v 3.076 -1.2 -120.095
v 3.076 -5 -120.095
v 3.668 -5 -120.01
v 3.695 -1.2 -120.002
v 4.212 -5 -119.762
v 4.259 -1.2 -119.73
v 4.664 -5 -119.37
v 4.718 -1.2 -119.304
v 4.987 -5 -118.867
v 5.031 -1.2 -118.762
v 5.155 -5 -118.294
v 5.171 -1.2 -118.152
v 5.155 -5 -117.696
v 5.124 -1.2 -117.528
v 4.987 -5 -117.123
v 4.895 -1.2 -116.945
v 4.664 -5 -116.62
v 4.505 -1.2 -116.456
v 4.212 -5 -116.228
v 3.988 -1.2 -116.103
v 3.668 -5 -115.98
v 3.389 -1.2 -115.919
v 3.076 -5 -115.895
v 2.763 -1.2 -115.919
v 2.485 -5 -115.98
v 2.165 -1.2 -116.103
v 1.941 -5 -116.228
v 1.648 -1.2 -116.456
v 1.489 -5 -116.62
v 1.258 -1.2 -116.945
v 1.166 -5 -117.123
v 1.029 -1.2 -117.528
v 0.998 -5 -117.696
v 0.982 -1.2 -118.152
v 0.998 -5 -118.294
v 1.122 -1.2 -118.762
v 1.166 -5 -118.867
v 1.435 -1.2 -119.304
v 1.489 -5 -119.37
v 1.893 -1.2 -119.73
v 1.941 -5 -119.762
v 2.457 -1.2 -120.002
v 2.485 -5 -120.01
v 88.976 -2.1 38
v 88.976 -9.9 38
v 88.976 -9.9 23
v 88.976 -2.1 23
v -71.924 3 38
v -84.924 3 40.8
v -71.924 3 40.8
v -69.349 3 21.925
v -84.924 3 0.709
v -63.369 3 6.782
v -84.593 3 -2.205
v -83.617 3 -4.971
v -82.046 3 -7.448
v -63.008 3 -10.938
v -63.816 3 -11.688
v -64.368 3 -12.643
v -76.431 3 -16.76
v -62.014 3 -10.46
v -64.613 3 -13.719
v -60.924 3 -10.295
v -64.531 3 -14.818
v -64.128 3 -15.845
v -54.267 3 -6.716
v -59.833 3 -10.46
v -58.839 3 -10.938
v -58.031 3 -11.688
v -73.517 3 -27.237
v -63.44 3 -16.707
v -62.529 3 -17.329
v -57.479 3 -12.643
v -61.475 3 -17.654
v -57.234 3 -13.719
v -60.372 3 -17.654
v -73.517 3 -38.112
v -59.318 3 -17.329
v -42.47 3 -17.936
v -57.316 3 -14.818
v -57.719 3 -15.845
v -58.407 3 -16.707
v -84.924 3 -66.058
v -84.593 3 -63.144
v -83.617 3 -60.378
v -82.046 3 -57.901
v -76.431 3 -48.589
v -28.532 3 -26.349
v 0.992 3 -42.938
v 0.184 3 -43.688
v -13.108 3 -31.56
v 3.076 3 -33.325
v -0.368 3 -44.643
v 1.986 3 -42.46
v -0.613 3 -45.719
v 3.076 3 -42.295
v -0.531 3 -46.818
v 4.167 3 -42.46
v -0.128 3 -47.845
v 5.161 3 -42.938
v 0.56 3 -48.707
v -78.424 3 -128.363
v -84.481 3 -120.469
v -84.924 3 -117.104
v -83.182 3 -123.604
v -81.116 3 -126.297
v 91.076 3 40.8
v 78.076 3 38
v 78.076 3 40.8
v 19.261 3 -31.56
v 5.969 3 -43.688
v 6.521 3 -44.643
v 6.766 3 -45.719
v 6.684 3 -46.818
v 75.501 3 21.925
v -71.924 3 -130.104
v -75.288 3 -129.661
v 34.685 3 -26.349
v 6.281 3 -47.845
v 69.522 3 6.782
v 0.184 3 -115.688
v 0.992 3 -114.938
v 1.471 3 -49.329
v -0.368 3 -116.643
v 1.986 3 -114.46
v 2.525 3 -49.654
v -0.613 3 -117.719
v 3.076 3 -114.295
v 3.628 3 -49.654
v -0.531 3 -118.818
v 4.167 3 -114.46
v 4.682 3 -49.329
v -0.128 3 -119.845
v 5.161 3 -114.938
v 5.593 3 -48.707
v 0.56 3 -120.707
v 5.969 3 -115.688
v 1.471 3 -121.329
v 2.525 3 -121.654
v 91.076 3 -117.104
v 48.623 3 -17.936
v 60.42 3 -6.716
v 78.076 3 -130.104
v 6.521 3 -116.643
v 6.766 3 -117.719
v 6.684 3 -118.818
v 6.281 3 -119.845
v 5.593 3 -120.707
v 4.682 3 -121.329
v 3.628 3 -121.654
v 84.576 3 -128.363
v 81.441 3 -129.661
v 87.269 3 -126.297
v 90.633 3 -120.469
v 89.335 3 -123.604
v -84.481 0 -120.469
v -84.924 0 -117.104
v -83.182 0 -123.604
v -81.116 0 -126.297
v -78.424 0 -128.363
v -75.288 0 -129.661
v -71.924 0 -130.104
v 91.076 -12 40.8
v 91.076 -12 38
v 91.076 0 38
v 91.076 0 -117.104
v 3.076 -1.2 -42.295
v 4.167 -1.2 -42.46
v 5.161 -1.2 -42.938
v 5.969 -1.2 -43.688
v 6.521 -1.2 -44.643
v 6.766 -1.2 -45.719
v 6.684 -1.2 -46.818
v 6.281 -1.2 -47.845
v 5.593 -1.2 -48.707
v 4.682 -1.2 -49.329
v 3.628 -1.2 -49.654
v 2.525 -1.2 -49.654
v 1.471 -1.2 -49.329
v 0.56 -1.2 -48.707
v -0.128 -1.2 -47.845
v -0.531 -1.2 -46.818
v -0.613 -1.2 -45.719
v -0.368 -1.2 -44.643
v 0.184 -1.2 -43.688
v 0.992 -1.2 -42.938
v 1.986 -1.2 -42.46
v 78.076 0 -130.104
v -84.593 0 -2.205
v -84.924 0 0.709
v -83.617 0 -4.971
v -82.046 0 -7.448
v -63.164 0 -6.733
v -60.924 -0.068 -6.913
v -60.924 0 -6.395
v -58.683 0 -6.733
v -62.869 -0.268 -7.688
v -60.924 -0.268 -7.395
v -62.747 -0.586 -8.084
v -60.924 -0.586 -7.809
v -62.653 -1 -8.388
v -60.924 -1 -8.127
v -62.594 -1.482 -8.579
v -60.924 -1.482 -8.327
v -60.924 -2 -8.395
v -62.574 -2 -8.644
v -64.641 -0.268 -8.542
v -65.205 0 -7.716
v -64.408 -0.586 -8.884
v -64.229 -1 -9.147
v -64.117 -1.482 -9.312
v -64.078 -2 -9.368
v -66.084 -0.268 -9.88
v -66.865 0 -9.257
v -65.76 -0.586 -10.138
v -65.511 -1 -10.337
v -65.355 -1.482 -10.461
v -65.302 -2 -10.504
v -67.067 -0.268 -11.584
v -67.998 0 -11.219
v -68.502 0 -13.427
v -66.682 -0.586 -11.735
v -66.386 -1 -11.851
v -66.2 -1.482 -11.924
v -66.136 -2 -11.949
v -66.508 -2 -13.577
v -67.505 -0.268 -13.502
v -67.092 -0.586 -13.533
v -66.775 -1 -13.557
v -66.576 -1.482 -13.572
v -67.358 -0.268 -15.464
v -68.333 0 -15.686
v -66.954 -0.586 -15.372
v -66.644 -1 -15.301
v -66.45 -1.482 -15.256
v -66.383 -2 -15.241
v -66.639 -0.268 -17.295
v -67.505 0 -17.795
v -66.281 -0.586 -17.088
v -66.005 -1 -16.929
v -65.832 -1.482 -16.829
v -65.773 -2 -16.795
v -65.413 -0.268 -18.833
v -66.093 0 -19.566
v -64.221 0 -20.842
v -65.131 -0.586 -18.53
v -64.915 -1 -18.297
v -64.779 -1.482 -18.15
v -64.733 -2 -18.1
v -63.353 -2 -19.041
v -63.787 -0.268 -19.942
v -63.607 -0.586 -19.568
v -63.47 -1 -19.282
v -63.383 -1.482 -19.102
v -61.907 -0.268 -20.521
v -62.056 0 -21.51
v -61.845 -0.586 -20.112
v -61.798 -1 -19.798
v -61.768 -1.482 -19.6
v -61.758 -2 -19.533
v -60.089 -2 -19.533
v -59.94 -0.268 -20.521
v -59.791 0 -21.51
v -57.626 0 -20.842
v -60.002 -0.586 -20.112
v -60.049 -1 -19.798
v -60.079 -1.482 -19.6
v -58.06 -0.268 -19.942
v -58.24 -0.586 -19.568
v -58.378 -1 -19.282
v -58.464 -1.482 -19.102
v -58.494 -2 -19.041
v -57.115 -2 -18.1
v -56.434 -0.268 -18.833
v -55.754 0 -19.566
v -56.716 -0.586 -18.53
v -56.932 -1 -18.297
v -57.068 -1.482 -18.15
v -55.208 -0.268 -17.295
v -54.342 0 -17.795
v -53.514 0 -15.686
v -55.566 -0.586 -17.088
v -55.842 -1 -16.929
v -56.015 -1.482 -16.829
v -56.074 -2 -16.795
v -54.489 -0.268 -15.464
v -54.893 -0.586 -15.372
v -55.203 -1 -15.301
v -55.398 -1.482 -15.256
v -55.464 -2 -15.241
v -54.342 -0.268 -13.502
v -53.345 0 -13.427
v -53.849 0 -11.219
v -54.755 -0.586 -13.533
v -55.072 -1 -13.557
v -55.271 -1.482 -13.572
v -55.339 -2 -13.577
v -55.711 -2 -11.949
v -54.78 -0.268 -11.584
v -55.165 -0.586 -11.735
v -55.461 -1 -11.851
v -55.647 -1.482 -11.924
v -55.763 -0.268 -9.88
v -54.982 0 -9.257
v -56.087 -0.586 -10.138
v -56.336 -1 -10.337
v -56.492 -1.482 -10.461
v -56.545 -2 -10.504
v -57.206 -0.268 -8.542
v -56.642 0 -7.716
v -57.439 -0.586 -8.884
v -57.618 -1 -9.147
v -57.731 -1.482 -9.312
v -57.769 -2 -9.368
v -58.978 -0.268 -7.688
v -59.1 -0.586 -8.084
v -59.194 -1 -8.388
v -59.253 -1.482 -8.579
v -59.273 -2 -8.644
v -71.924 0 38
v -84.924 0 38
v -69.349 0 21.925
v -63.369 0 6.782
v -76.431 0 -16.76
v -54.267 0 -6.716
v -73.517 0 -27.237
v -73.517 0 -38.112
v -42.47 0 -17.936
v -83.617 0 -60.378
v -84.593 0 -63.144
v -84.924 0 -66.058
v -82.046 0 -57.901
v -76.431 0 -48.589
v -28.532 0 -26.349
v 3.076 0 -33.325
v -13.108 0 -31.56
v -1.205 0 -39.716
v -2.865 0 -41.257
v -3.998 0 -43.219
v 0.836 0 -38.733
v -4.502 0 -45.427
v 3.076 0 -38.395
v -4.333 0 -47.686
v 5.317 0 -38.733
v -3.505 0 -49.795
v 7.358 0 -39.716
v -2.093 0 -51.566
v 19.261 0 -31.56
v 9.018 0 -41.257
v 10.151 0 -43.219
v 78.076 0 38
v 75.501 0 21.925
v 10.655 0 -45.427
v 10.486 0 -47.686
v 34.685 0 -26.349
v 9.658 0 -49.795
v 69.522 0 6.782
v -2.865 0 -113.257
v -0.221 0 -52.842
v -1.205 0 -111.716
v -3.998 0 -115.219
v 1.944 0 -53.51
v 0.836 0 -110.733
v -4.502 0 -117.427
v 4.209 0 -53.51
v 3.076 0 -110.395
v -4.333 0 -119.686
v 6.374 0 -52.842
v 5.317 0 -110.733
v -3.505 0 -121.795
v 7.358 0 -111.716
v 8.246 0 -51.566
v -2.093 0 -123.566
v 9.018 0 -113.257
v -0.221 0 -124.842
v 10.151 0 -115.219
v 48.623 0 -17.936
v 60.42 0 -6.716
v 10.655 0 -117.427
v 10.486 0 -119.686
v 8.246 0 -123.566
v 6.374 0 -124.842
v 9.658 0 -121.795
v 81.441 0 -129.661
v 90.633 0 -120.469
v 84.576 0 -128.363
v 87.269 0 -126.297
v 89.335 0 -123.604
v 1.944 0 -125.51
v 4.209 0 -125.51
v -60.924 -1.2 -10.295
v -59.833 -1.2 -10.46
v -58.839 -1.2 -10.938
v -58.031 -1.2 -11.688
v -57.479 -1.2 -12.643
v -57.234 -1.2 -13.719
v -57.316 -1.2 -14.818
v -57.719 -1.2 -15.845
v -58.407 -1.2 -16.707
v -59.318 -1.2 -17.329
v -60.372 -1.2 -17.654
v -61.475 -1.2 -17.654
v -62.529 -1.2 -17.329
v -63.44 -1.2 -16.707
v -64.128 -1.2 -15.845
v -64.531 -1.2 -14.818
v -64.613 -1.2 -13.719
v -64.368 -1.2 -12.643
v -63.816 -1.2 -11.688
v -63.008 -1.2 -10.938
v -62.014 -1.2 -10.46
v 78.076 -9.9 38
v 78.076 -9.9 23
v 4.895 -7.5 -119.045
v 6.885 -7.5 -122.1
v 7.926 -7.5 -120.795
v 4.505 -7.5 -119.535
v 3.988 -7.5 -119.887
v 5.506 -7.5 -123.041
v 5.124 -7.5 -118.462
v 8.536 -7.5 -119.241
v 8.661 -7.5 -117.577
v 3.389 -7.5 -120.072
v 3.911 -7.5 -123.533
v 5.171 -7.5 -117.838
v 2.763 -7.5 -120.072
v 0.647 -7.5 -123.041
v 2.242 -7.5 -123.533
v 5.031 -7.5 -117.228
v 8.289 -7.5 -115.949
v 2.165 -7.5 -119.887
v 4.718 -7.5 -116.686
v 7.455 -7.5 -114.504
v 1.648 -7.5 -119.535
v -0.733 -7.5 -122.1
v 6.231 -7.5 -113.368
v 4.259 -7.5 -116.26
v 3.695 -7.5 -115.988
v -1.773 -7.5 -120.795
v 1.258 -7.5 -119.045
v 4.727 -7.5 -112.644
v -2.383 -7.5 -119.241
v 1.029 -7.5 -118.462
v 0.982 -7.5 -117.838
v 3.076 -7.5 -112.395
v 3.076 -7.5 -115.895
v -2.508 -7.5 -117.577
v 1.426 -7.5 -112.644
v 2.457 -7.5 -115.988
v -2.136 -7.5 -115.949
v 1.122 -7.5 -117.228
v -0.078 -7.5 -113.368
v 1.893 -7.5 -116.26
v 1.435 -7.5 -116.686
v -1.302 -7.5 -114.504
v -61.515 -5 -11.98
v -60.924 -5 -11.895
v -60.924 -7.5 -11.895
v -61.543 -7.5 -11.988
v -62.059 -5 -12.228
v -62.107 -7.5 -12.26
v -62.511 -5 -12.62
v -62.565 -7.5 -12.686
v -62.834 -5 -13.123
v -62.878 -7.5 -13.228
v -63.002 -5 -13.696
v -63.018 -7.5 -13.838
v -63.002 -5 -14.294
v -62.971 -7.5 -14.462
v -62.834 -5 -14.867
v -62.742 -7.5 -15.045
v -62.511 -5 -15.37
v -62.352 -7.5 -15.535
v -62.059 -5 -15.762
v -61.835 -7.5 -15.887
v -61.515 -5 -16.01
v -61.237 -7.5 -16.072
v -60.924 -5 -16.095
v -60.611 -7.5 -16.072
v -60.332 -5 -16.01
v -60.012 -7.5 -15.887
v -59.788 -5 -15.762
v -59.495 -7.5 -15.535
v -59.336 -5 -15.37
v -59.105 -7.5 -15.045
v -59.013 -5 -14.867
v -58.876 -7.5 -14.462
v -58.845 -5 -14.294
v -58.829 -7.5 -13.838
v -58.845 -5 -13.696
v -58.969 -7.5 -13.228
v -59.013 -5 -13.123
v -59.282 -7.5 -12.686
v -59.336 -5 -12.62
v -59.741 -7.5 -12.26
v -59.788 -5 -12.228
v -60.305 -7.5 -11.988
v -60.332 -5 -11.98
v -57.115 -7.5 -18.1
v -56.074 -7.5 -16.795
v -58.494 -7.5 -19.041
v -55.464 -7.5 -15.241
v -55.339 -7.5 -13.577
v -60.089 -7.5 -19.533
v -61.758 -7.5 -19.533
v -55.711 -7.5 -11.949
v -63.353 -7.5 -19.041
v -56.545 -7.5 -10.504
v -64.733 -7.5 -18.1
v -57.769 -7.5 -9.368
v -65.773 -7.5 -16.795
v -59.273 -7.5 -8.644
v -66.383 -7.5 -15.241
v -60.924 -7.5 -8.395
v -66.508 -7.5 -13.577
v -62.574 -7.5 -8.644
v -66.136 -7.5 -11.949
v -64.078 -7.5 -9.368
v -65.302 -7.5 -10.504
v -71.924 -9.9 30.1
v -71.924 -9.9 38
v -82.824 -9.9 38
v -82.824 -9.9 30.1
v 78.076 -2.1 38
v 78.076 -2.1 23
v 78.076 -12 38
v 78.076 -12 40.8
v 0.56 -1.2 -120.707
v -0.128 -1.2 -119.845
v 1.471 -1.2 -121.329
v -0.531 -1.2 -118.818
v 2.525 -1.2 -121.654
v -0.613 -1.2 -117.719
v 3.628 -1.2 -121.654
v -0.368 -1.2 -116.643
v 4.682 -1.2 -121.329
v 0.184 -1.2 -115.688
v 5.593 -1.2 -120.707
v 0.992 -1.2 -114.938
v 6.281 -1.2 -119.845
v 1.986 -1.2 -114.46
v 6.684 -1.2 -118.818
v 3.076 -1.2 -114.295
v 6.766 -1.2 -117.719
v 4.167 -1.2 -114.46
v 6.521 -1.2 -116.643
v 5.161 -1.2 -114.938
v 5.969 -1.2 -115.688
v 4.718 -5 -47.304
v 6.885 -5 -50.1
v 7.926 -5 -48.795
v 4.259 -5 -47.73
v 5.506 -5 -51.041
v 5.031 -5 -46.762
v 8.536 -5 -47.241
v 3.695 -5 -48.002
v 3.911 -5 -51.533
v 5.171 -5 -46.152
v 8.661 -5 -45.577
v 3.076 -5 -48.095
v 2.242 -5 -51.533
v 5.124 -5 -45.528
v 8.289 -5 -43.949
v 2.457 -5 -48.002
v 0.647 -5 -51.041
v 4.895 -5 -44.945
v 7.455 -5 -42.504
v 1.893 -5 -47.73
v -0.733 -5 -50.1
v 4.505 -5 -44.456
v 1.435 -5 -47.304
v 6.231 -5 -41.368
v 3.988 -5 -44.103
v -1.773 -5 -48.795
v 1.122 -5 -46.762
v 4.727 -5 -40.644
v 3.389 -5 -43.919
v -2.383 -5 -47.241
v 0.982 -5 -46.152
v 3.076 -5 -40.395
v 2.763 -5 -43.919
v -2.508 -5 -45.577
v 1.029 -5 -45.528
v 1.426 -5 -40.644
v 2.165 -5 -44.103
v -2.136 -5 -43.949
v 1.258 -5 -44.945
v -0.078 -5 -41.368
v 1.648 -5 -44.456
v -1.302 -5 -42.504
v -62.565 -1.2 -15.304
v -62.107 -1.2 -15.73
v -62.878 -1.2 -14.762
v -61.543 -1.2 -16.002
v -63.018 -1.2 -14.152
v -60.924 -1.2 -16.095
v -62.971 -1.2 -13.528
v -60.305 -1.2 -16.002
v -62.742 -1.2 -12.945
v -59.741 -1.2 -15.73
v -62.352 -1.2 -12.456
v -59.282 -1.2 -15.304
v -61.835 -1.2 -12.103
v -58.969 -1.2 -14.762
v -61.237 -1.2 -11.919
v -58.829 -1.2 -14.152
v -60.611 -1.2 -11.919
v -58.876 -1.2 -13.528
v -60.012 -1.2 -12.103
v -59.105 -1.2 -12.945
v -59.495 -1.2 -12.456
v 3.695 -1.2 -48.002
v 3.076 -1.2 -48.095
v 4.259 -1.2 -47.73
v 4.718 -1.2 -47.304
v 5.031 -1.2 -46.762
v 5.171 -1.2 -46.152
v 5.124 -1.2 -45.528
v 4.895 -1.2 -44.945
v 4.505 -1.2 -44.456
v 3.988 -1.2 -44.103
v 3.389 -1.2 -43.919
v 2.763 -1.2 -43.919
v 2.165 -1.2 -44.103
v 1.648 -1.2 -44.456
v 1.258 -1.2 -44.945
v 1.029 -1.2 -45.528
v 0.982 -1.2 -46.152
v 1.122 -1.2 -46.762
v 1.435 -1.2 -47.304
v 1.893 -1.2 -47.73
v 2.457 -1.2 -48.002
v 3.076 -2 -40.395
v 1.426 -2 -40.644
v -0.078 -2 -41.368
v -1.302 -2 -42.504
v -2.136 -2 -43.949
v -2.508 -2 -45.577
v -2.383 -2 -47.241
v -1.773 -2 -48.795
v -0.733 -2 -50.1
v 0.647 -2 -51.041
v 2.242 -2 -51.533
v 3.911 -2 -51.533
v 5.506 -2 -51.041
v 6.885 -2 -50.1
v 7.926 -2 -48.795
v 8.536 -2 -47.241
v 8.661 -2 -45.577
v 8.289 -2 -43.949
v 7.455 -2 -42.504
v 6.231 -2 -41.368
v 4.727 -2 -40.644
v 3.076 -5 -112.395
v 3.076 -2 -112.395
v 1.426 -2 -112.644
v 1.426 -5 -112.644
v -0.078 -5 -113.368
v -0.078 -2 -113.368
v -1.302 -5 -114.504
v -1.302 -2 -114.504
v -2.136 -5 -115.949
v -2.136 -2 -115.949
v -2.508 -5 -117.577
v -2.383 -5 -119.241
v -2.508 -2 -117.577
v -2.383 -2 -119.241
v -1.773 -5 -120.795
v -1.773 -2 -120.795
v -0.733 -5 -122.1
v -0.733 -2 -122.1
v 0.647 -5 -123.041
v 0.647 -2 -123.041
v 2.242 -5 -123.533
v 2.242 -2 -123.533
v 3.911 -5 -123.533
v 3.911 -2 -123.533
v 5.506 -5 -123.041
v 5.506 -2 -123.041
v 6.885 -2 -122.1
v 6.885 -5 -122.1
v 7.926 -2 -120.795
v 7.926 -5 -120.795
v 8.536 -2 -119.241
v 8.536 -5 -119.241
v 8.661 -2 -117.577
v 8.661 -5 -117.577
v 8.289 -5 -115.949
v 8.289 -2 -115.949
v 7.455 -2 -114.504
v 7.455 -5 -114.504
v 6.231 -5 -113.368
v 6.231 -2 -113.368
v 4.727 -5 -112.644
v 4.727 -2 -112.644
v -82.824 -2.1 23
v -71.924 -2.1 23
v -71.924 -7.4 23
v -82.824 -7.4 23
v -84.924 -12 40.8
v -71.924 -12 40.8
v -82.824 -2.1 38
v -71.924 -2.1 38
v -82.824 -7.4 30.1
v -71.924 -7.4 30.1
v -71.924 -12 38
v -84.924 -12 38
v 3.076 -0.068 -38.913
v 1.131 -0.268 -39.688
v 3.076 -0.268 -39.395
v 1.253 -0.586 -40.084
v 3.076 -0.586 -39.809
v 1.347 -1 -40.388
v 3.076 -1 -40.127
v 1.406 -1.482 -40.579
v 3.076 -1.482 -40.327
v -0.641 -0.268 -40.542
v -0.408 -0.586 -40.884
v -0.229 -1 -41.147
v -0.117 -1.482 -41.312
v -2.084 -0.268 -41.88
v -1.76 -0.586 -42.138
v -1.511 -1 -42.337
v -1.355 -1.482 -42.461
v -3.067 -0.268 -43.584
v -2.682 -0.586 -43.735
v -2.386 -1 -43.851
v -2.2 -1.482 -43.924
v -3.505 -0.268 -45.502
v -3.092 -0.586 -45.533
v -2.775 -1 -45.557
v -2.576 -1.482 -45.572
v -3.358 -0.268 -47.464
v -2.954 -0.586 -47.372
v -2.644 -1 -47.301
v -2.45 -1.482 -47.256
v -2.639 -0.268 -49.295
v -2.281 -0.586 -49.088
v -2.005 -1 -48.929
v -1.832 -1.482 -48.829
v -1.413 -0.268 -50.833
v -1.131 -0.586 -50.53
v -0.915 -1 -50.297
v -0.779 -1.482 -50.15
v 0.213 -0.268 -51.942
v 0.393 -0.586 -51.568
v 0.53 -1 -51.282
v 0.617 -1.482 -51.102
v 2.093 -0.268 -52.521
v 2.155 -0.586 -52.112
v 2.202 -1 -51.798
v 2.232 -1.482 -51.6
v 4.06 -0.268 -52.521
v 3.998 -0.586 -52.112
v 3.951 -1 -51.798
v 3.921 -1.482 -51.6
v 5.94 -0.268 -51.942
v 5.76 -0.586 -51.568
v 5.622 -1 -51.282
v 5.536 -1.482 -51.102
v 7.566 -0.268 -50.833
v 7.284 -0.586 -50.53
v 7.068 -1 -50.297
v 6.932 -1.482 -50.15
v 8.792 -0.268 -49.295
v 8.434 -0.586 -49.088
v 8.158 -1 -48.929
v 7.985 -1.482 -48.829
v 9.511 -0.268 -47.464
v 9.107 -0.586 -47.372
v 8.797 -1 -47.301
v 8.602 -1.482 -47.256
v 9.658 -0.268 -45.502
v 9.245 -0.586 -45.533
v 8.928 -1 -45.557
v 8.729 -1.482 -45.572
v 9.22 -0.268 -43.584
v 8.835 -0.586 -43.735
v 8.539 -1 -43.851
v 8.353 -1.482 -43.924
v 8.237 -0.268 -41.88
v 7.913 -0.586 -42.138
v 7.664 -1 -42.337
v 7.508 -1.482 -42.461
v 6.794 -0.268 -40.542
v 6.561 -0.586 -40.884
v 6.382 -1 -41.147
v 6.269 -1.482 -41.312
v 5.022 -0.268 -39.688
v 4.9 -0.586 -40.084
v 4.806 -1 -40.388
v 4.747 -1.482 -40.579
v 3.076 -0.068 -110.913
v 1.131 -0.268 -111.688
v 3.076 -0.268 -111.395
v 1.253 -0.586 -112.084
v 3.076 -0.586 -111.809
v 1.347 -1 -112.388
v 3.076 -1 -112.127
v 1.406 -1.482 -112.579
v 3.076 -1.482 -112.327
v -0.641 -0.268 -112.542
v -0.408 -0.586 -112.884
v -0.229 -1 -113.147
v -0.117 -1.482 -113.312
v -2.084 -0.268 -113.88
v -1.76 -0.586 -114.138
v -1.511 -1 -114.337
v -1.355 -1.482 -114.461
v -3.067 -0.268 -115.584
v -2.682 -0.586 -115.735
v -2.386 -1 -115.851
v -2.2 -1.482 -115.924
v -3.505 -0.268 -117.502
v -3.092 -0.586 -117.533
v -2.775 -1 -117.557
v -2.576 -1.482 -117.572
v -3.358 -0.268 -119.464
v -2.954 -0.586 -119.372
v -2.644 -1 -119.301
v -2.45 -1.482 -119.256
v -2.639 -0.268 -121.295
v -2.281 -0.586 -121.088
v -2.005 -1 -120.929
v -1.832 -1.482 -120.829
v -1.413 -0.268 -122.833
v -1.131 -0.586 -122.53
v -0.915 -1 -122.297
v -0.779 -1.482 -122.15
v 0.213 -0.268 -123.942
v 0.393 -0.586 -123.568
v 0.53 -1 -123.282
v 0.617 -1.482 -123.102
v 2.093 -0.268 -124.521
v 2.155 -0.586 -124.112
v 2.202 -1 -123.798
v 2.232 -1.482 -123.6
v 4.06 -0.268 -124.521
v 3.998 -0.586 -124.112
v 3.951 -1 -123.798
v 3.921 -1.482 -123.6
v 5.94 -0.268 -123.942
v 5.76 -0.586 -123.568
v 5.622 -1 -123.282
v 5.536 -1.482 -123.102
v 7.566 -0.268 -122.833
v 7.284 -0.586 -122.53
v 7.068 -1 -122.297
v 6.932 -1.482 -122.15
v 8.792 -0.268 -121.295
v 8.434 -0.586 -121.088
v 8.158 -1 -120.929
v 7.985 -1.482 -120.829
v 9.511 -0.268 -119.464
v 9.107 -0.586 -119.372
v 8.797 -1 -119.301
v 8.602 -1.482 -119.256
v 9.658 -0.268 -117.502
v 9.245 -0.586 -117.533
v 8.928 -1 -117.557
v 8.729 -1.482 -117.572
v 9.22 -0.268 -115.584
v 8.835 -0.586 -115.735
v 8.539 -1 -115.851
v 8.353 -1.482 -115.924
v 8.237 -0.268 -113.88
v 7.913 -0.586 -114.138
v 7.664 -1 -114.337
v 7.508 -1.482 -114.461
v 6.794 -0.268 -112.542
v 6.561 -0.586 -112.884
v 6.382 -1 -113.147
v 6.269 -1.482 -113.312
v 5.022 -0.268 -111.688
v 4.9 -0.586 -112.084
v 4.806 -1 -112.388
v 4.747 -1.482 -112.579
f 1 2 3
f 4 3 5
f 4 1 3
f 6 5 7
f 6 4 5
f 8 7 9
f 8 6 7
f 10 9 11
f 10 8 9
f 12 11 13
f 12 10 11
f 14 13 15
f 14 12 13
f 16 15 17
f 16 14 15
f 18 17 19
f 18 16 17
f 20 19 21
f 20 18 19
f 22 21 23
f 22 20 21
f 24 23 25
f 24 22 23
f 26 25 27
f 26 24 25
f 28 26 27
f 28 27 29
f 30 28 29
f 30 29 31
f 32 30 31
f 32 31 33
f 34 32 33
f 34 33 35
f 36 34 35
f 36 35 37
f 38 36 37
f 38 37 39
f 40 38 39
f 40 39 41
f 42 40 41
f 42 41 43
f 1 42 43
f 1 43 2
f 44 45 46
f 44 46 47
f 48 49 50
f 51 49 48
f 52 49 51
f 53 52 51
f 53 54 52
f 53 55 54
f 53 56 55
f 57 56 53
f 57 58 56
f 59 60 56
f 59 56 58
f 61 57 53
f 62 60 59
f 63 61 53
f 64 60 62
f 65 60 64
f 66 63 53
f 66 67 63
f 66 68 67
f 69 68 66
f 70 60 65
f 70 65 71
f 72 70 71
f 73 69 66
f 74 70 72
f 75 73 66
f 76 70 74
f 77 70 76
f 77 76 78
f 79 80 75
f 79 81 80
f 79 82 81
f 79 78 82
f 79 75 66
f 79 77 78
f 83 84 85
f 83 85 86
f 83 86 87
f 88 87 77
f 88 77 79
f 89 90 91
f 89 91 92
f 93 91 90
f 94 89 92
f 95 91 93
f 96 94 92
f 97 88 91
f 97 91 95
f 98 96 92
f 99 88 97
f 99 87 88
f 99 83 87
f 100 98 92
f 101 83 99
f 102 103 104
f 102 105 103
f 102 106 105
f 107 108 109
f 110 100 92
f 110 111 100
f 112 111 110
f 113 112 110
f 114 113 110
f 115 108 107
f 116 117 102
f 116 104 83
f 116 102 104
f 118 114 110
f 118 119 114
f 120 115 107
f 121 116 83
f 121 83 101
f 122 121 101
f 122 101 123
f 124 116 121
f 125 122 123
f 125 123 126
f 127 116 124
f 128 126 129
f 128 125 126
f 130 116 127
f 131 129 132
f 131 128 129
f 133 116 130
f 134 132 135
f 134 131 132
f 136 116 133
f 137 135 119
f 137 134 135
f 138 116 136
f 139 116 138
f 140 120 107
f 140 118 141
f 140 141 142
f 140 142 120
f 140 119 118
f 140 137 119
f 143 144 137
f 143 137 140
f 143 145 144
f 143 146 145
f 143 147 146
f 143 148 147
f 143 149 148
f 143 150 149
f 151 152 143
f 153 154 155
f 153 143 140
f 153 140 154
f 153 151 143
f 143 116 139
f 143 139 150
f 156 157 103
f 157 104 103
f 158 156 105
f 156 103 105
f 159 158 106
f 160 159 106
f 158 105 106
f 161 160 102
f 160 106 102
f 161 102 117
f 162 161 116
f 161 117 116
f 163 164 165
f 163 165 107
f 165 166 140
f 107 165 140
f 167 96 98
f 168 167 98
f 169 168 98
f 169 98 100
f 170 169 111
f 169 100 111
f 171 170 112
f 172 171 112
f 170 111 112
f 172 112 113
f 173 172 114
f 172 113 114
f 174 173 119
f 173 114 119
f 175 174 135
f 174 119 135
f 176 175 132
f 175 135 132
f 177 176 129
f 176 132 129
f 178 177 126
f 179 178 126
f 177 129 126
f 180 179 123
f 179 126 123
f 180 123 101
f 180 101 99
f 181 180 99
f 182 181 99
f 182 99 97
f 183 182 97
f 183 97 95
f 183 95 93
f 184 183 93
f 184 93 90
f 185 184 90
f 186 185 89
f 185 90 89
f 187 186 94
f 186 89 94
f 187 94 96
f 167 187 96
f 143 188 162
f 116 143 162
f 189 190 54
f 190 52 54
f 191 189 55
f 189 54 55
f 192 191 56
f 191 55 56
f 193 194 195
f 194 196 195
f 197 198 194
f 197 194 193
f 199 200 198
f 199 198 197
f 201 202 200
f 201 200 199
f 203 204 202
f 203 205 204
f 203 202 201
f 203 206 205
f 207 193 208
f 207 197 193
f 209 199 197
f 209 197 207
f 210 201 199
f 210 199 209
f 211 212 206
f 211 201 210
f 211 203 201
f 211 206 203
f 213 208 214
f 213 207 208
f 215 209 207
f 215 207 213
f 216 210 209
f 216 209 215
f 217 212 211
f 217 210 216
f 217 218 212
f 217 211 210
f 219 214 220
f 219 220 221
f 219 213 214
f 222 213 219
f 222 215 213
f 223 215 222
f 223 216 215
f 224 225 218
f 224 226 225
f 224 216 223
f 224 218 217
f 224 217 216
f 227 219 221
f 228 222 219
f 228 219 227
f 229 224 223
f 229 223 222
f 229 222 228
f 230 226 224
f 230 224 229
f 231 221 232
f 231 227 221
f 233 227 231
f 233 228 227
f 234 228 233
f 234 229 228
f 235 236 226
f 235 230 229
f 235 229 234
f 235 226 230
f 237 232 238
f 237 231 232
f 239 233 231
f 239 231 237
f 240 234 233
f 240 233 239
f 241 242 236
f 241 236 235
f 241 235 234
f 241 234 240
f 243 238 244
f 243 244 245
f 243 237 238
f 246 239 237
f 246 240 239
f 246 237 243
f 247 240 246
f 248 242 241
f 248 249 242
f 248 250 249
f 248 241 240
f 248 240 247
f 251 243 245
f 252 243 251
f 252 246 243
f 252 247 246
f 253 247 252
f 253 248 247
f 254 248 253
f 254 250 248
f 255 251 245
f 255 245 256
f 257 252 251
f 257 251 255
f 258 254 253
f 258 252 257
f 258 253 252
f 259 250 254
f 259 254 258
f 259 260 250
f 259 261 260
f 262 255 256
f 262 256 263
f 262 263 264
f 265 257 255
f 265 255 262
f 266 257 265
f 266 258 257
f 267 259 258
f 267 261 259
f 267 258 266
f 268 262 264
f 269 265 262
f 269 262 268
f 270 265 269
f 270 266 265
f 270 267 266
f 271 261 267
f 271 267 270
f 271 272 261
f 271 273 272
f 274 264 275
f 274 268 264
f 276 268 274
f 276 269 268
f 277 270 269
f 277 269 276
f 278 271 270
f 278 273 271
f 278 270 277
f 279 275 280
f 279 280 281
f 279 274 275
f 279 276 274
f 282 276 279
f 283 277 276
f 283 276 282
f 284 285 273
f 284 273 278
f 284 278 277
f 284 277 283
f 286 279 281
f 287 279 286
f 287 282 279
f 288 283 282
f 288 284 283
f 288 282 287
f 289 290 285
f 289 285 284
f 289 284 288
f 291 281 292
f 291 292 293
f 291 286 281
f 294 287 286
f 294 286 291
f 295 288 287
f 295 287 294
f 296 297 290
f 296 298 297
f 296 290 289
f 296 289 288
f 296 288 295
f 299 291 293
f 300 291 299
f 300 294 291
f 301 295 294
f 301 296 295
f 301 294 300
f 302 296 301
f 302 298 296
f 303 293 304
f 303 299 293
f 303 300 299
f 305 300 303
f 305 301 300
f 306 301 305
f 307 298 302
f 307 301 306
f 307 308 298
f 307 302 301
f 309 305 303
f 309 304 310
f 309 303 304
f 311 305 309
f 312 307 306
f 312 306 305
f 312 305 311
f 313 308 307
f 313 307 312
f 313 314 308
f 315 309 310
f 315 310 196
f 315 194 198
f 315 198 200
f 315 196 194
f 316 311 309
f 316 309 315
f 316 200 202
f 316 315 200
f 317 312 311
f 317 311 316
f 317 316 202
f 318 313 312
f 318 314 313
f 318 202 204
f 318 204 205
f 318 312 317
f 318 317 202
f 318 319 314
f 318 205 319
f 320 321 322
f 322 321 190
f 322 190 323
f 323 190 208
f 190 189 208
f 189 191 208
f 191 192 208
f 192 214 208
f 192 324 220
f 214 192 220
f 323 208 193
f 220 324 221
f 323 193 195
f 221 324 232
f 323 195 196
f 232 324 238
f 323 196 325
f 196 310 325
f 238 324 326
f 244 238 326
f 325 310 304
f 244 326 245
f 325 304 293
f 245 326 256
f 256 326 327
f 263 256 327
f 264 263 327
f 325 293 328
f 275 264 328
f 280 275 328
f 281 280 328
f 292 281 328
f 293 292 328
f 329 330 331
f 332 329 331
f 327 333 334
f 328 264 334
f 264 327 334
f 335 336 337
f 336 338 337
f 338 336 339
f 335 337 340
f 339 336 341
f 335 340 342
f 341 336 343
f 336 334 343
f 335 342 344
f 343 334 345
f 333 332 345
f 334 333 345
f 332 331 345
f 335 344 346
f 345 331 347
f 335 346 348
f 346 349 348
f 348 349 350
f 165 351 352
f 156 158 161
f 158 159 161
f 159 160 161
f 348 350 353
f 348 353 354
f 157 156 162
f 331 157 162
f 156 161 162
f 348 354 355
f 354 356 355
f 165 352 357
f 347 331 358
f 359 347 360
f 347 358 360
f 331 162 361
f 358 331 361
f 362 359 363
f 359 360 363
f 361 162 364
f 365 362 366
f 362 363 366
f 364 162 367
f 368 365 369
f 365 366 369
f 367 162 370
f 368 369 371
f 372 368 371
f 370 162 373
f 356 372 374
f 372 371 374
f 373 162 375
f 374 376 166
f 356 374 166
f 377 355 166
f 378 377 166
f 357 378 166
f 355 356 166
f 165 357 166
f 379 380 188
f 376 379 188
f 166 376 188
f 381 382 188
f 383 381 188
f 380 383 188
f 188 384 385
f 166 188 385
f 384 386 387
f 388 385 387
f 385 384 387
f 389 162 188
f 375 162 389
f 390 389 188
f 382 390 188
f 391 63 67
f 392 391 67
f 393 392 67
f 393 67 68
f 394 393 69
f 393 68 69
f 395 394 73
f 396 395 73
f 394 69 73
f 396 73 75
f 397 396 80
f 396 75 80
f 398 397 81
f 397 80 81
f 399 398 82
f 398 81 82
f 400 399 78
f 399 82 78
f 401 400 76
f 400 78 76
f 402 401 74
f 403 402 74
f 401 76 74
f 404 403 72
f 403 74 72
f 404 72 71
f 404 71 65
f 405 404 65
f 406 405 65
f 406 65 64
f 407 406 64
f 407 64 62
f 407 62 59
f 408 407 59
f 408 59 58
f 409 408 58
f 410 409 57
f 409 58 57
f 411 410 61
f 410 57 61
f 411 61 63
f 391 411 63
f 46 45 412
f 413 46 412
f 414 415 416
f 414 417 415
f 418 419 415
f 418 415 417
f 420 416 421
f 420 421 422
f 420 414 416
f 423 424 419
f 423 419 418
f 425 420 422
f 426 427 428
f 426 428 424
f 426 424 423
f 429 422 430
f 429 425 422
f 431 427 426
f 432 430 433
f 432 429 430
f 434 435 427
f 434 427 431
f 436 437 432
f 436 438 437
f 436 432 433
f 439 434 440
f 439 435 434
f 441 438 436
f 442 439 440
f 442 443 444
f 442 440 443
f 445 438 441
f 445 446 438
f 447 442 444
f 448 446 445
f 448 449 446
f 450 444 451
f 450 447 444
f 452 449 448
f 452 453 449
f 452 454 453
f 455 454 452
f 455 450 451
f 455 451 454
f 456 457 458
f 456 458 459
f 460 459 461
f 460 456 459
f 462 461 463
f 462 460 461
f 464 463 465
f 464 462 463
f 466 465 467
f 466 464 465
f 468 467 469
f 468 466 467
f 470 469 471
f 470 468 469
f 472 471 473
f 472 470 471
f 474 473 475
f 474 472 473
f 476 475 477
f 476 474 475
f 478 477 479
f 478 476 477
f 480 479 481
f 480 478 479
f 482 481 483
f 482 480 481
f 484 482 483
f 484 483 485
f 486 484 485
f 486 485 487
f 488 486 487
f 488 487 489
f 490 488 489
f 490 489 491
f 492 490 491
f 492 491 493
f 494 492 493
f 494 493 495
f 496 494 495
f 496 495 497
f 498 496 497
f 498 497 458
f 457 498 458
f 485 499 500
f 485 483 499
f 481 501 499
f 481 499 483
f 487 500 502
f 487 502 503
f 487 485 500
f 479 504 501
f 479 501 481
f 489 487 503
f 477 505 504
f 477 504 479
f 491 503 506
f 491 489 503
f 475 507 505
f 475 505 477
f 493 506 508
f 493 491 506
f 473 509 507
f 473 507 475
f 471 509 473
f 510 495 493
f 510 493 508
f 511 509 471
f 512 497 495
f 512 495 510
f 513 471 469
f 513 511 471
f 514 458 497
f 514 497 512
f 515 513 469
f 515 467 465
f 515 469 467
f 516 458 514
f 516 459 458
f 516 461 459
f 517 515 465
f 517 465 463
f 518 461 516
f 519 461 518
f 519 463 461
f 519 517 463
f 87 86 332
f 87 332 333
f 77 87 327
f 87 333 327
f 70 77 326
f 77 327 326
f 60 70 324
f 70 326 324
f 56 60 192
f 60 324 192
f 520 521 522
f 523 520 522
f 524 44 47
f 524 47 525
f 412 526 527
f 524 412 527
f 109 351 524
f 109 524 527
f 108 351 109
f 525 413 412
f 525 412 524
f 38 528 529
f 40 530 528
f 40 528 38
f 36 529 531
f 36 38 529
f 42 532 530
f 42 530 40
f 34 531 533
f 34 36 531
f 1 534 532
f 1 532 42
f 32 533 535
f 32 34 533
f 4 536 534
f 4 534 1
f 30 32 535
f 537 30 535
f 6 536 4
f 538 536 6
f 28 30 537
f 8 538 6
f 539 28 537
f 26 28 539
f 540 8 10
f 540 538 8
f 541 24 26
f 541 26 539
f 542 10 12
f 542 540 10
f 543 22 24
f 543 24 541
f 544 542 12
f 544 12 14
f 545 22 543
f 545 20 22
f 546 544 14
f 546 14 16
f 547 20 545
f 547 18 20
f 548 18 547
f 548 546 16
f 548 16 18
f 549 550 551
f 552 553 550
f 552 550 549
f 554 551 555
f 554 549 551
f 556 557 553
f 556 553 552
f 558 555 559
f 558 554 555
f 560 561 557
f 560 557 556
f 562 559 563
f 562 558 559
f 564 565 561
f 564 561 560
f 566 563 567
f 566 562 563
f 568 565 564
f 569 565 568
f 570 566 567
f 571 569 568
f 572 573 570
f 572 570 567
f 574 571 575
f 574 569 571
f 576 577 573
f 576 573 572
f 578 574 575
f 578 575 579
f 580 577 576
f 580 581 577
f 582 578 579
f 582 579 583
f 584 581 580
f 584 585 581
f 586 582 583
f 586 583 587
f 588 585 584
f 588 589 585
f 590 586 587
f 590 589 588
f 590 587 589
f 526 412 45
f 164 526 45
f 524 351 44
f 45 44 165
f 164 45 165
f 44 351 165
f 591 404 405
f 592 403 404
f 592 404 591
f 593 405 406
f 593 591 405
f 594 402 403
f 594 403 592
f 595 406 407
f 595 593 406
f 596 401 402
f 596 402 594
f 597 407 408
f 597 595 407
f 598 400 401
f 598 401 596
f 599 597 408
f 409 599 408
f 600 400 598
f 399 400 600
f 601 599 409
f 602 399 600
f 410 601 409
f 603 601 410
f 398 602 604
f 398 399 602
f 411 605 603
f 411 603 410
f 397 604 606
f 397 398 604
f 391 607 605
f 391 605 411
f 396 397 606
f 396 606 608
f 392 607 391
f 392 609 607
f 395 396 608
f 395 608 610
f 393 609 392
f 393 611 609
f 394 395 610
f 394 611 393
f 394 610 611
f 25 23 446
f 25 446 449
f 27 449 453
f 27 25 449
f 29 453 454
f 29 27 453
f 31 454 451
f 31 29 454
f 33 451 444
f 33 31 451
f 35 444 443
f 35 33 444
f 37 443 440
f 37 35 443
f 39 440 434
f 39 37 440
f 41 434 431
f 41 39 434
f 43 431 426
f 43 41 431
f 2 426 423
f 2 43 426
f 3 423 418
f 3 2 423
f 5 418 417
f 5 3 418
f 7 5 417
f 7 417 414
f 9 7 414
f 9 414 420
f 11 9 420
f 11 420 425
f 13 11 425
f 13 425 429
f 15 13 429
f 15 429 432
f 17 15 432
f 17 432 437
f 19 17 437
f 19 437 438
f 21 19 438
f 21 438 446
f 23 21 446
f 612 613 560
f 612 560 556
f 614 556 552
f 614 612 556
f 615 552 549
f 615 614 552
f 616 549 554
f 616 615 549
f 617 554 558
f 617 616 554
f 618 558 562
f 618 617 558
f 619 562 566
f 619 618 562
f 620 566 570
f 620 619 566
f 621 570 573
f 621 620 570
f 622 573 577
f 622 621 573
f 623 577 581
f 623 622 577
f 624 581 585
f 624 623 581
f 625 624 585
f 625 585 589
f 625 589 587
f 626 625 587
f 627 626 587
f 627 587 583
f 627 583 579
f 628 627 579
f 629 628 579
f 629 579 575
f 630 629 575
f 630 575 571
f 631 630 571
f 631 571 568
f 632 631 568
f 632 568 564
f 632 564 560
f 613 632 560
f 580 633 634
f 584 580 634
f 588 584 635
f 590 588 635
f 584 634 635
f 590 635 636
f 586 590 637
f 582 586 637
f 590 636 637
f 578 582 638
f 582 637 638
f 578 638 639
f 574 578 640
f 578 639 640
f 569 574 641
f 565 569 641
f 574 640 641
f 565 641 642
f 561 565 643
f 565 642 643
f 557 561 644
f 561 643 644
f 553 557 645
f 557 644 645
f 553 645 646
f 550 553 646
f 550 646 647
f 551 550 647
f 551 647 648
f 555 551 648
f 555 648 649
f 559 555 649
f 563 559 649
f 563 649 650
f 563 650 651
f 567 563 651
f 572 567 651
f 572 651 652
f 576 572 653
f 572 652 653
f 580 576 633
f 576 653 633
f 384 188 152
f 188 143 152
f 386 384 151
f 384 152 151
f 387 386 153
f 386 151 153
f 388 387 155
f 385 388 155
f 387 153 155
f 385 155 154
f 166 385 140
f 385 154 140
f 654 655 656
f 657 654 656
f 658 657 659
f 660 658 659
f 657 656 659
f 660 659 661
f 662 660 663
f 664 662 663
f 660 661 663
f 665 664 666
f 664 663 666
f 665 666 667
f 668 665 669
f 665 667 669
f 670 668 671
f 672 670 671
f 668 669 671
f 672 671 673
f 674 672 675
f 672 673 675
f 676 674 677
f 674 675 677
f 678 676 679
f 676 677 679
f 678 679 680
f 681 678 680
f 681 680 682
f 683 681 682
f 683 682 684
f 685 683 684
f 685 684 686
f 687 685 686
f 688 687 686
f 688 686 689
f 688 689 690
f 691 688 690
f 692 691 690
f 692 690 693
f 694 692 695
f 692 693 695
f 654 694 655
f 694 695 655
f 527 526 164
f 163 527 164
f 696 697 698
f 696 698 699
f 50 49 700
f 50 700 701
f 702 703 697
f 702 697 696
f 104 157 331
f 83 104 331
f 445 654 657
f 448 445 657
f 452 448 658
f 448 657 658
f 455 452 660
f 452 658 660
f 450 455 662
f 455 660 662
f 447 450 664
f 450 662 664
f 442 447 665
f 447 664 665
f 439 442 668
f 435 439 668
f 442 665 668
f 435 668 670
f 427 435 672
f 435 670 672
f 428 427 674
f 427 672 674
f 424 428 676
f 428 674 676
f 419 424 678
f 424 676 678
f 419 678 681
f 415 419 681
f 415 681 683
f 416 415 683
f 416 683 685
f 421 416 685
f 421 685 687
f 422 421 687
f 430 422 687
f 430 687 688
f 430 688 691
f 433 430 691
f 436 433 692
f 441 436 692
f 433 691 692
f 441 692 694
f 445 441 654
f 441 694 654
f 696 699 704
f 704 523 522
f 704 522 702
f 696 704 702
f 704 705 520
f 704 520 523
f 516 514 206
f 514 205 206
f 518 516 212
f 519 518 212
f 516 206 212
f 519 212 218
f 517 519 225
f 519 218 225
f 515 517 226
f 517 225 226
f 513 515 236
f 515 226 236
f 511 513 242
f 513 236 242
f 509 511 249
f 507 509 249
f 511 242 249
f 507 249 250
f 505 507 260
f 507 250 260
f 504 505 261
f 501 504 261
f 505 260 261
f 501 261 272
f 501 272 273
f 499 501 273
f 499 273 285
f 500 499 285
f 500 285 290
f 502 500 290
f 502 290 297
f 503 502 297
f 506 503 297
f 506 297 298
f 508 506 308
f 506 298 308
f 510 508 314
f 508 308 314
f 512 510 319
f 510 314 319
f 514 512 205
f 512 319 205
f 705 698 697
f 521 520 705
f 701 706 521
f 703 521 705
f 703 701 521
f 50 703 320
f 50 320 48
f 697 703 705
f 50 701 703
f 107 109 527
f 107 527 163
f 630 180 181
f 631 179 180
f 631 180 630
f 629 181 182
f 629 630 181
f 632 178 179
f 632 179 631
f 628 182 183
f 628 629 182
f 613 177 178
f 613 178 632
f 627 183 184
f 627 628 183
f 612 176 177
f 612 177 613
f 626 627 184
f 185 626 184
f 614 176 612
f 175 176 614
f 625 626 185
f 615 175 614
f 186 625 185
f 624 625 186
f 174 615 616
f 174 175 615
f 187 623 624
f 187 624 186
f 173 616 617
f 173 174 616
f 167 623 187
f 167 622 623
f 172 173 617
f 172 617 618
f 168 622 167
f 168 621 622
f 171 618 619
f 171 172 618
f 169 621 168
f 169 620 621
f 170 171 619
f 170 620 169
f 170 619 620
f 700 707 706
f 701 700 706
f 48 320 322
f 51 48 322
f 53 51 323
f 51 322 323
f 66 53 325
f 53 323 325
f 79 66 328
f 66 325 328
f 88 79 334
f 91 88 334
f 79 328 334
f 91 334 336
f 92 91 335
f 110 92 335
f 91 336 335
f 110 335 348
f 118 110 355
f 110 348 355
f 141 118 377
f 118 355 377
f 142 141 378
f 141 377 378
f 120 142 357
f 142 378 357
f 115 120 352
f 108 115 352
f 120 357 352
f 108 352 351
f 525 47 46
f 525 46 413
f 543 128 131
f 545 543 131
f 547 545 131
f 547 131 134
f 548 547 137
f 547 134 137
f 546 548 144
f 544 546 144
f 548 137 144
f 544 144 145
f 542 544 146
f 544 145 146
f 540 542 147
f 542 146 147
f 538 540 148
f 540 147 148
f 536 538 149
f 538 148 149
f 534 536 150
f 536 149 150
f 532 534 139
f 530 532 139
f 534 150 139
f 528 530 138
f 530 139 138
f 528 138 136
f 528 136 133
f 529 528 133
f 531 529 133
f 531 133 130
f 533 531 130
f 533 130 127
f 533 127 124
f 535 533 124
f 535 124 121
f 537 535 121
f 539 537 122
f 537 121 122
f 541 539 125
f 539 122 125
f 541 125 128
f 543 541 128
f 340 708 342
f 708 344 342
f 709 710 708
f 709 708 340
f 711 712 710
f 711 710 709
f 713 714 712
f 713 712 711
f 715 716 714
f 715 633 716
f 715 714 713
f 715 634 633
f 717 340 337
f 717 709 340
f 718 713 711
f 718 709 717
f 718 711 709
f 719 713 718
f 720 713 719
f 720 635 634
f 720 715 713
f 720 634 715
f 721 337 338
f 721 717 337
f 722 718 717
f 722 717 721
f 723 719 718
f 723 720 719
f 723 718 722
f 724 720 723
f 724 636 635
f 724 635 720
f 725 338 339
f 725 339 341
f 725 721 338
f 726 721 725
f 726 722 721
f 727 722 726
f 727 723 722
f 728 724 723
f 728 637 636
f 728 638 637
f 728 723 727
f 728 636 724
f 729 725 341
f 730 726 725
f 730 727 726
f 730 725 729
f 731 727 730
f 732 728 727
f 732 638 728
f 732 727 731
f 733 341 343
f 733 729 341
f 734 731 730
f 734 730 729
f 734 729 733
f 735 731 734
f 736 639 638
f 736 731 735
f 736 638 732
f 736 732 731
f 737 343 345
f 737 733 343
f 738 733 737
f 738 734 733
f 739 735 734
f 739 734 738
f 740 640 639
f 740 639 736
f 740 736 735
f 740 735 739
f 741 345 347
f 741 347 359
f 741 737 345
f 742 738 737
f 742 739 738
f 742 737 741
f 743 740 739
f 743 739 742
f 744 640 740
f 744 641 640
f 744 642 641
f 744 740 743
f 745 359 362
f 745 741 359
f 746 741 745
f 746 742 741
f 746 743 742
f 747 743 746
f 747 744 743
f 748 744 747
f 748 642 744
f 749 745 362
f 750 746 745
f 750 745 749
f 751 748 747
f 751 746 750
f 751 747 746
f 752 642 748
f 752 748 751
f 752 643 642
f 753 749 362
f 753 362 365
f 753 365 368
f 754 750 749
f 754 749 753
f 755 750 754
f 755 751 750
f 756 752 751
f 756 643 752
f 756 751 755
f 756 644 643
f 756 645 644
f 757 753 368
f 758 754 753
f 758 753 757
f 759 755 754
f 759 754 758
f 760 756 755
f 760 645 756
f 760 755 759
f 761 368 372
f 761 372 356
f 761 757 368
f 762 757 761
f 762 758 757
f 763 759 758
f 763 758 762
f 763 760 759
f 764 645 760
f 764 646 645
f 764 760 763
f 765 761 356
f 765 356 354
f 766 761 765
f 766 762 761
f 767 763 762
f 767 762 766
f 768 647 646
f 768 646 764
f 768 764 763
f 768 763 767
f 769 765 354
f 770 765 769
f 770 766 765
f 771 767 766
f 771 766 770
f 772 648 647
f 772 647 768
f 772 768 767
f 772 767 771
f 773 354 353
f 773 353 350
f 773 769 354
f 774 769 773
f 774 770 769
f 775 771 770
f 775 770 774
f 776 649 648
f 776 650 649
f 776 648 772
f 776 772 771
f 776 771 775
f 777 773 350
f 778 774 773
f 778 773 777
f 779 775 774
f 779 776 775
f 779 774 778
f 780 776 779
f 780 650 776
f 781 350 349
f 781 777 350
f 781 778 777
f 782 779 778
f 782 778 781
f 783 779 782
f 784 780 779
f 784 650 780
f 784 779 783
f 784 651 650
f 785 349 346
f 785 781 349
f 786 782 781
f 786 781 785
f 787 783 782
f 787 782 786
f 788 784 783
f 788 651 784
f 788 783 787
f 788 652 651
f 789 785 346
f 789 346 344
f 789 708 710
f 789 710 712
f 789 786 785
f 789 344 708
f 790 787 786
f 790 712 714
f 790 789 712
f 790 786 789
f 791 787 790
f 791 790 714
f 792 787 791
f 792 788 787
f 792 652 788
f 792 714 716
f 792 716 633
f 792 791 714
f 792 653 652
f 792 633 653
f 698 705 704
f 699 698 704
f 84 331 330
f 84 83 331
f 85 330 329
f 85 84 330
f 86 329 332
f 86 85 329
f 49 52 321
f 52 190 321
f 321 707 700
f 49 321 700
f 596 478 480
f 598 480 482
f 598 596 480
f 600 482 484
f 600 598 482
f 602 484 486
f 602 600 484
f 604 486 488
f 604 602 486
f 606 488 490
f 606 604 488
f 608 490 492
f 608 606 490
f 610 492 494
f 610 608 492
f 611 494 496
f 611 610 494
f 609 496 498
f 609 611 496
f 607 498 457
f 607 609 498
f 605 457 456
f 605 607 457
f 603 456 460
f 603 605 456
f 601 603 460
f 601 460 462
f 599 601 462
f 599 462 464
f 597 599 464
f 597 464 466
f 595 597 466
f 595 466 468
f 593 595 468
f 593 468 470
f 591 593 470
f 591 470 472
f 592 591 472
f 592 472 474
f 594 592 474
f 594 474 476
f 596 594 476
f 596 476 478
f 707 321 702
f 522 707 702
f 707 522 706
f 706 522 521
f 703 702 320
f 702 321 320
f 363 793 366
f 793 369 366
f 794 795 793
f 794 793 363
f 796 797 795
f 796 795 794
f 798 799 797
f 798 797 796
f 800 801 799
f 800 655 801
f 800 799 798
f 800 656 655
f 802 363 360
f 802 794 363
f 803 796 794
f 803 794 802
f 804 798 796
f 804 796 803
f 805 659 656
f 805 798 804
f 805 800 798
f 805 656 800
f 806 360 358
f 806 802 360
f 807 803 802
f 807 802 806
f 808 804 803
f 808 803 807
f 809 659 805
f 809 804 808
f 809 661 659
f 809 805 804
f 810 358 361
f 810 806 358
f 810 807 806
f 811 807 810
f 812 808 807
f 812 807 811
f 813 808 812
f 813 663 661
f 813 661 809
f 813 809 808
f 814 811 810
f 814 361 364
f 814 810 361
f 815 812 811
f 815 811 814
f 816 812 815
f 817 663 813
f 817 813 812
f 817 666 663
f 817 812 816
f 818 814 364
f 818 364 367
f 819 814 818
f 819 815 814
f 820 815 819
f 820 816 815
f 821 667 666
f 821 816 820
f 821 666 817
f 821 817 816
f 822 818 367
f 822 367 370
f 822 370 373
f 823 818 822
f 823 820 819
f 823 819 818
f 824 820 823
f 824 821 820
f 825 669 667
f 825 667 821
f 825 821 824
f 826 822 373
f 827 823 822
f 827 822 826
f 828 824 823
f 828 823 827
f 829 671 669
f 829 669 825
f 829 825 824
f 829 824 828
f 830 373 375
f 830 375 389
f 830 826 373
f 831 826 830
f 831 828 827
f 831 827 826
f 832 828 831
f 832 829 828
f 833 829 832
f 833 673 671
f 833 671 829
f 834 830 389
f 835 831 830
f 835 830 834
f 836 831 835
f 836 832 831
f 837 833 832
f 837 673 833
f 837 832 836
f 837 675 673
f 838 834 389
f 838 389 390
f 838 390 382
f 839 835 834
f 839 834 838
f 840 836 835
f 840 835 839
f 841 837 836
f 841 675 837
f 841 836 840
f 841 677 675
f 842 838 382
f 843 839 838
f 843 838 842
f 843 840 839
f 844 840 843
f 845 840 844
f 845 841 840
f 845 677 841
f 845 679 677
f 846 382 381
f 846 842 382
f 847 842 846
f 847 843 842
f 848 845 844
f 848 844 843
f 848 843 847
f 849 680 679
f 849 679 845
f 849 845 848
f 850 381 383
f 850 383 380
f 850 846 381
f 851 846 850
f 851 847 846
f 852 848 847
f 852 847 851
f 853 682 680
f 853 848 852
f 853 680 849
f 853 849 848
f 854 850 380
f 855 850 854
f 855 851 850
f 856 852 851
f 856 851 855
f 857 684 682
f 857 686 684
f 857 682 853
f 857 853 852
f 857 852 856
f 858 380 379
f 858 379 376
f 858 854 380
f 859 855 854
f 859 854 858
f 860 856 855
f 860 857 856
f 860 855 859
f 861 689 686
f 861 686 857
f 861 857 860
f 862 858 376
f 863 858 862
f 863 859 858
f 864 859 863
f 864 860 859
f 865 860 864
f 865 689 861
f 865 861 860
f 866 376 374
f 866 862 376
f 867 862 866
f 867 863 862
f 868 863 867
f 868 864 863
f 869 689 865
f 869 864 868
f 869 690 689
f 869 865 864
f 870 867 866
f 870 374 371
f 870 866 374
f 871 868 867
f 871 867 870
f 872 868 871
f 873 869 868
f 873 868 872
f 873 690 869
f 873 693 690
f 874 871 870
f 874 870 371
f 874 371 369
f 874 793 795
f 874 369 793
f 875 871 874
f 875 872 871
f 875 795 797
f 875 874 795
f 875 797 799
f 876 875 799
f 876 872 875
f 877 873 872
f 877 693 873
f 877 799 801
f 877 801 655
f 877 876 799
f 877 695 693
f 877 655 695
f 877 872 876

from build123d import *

# Parameters (mm, degrees)
BOSS_EXTRUDE1_DEPTH = 3
SKETCH2_W           = 13
SKETCH2_H           = 15
BOSS_EXTRUDE2_DEPTH = 2.8
SKETCH3_W           = 10.9
SKETCH3_H           = 7.8
SKETCH3_H_2         = 5.3
BOSS_EXTRUDE3_DEPTH = 15
SKETCH4_W           = 10.9
SKETCH4_H           = 2.5
BOSS_EXTRUDE4_DEPTH = 7.9
FILLET3_R           = 13
SKETCH5_R           = 5.6
SKETCH5_R_2         = 2.1
BOSS_EXTRUDE5_DEPTH = 5
CUT_EXTRUDE1_START  = -7.9
SKETCH6_R           = 2.1
CUT_EXTRUDE1_DEPTH  = 7.9
SKETCH7_R           = 3.7
CUT_EXTRUDE2_DEPTH  = 4.2
FILLET5_R           = 2
SKETCH8_R           = 5.6
SKETCH8_R_2         = 2.1
BOSS_EXTRUDE6_DEPTH = 2.5


with BuildPart() as part:
    # Sketch1 → Boss-Extrude1 (new body)
    with BuildSketch(Plane(origin=(0, 0, 0), x_dir=(1, 0, 0), z_dir=(0, 1, 0))):
        with BuildLine():
            Line((78.076457806, -38), (91.076457806, -38))
            Line((91.076457806, -38), (91.076457806, 130.104439919))
            Line((91.076457806, 130.104439919), (-84.923542194, 130.104439919))
            Line((-84.923542194, 130.104439919), (-84.923542194, 72.662298294))
            Line((-84.923542194, 72.662298294), (-84.923542194, 61.104439919))
            ThreePointArc((-84.923542194, 61.104439919), (-73.14747421, 32.674496882), (-84.923542194, 4.244553845))
            Line((-84.923542194, 4.244553845), (-84.923542194, 0))
            Line((-84.923542194, 0), (-84.923542194, -38))
            Line((-84.923542194, -38), (-71.923542194, -38))
            ThreePointArc((-71.923542194, -38), (3.076457806, 33.325120397), (78.076457806, -38))
        make_face()
    extrude(amount=BOSS_EXTRUDE1_DEPTH)

    # Sketch2 → Boss-Extrude2 (add)
    with BuildSketch(Plane.XY.offset(38)):
        with Locations((84.576457806, -4.5)):
            Rectangle(SKETCH2_W, SKETCH2_H)
        with Locations((-78.423542194, -4.5)):
            Rectangle(SKETCH2_W, SKETCH2_H)
    extrude(amount=BOSS_EXTRUDE2_DEPTH)

    # Sketch3 → Boss-Extrude3 (add)
    with BuildSketch(Plane(origin=(0, 0, 38), x_dir=(-1, 0, 0), z_dir=(0, 0, -1))):
        with Locations((-83.526457806, -6)):
            Rectangle(SKETCH3_W, SKETCH3_H)
        with Locations((77.373542194, -4.75)):
            Rectangle(SKETCH3_W, SKETCH3_H_2)
    extrude(amount=BOSS_EXTRUDE3_DEPTH)

    # Sketch4 → Boss-Extrude4 (add)
    with BuildSketch(Plane(origin=(0, 0, 38), x_dir=(-1, 0, 0), z_dir=(0, 0, -1))):
        with Locations((77.373542194, -8.65)):
            Rectangle(SKETCH4_W, SKETCH4_H)
    extrude(amount=BOSS_EXTRUDE4_DEPTH)

    # Fillet3
    fillet3_edges = [part.edges().sort_by_distance(p)[0] for p in [
        (-84.923542194, 1.5, -130.104439919),
        (91.076457806, 1.5, -130.104439919),
        (-84.923542194, 1.5, -4.244553845),
        (-84.923542194, 1.5, -61.104439919),
    ]]
    fillet(fillet3_edges, radius=FILLET3_R)

    # Sketch5 → Boss-Extrude5 (add)
    # profile 1 of 3: a face of its own
    with BuildSketch(Plane.XZ):
        with Locations(Location((3.076457806, -45.995120397, 0), (0, 0, 90))):
            Circle(SKETCH5_R)
        with Locations(Location((3.076457806, -45.995120397, 0), (0, 0, 270))):
            Circle(SKETCH5_R_2, mode=Mode.SUBTRACT)
    # profile 2 of 3: a face of its own
    with BuildSketch(Plane.XZ):
        with Locations(Location((-60.923542194, -13.995120397, 0), (0, 0, 90))):
            Circle(SKETCH5_R)
        with Locations(Location((-60.923542194, -13.995120397, 0), (0, 0, 270))):
            Circle(SKETCH5_R_2, mode=Mode.SUBTRACT)
    # profile 3 of 3: a face of its own
    with BuildSketch(Plane.XZ):
        with Locations(Location((3.076457806, -117.995120397, 0), (0, 0, 90))):
            Circle(SKETCH5_R)
        with Locations(Location((3.076457806, -117.995120397, 0), (0, 0, 270))):
            Circle(SKETCH5_R_2, mode=Mode.SUBTRACT)
    extrude(amount=BOSS_EXTRUDE5_DEPTH)

    # Sketch6 → Cut-Extrude1 (cut)
    with BuildSketch(Plane(origin=(0, 0, 0), x_dir=(-1, 0, 0), z_dir=(0, -1, 0)).offset(CUT_EXTRUDE1_START)):
        with Locations(Location((-3.076457806, 45.995120397, 0), (0, 0, 270))):
            Circle(SKETCH6_R)
        with Locations(Location((60.923542194, 13.995120397, 0), (0, 0, 270))):
            Circle(SKETCH6_R)
        with Locations(Location((-3.076457806, 117.995120397, 0), (0, 0, 270))):
            Circle(SKETCH6_R)
    extrude(amount=CUT_EXTRUDE1_DEPTH, mode=Mode.SUBTRACT)

    # Sketch7 → Cut-Extrude2 (cut)
    with BuildSketch(Plane(origin=(0, 3, 0), x_dir=(1, 0, 0), z_dir=(0, 1, 0))):
        with Locations(Location((3.076457806, 45.995120397, 0), (0, 0, 270))):
            Circle(SKETCH7_R)
        with Locations(Location((-60.923542194, 13.995120397, 0), (0, 0, 270))):
            Circle(SKETCH7_R)
        with Locations(Location((3.076457806, 117.995120397, 0), (0, 0, 270))):
            Circle(SKETCH7_R)
    extrude(amount=-CUT_EXTRUDE2_DEPTH, mode=Mode.SUBTRACT)

    # Fillet5
    fillet5_edges = [part.edges().sort_by_distance(p)[0] for p in [
        (3.076457806, 0, -51.595120397),
        (-60.923542194, 0, -19.595120397),
        (3.076457806, 0, -123.595120397),
    ]]
    fillet(fillet5_edges, radius=FILLET5_R)

    # Sketch8 → Boss-Extrude6 (add)
    # profile 1 of 2: a face of its own
    with BuildSketch(Plane.XZ.offset(5)):
        with Locations(Location((-60.923542194, -13.995120397, 0), (0, 0, 90))):
            Circle(SKETCH8_R)
        with Locations(Location((-60.923542194, -13.995120397, 0), (0, 0, 90))):
            Circle(SKETCH8_R_2, mode=Mode.SUBTRACT)
    # profile 2 of 2: a face of its own
    with BuildSketch(Plane.XZ.offset(5)):
        with Locations(Location((3.076457806, -117.995120397, 0), (0, 0, 90))):
            Circle(SKETCH8_R)
        with Locations(Location((3.076457806, -117.995120397, 0), (0, 0, 90))):
            Circle(SKETCH8_R_2, mode=Mode.SUBTRACT)
    extrude(amount=BOSS_EXTRUDE6_DEPTH)


solid = part.part
